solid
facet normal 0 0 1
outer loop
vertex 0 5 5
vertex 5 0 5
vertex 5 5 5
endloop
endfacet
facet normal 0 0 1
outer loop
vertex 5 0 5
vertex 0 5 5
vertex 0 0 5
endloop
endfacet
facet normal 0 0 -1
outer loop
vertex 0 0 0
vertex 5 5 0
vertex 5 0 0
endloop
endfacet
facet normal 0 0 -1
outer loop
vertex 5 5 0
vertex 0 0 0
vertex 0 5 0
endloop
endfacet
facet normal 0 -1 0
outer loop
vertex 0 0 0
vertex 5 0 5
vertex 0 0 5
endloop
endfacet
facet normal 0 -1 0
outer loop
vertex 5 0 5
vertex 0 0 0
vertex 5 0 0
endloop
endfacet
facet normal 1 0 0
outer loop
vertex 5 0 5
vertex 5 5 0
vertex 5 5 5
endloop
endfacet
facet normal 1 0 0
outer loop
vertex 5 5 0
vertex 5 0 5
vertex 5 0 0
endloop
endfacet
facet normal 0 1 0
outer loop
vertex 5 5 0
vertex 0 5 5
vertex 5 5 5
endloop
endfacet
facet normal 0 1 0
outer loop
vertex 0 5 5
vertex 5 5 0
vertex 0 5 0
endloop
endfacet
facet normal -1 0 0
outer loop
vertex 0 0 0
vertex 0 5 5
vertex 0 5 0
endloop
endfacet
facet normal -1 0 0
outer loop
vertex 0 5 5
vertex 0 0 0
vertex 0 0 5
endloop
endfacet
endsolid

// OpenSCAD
// file: mylib/shapes.scad
// Sibling file included by std.scad
module myshape() {
    cube([5, 5, 5]);
}
// file: mylib/std.scad
// Library entry point — includes sibling files (like BOSL2/std.scad)
include <shapes.scad>
// main file
// Test: main file includes a library entry point that itself includes sibling files.
// Simulates the BOSL2 pattern: include <BOSL2/std.scad> where std.scad includes <transforms.scad>
include <mylib/std.scad>

// Use a module defined in shapes.scad (included transitively via std.scad)
myshape();
